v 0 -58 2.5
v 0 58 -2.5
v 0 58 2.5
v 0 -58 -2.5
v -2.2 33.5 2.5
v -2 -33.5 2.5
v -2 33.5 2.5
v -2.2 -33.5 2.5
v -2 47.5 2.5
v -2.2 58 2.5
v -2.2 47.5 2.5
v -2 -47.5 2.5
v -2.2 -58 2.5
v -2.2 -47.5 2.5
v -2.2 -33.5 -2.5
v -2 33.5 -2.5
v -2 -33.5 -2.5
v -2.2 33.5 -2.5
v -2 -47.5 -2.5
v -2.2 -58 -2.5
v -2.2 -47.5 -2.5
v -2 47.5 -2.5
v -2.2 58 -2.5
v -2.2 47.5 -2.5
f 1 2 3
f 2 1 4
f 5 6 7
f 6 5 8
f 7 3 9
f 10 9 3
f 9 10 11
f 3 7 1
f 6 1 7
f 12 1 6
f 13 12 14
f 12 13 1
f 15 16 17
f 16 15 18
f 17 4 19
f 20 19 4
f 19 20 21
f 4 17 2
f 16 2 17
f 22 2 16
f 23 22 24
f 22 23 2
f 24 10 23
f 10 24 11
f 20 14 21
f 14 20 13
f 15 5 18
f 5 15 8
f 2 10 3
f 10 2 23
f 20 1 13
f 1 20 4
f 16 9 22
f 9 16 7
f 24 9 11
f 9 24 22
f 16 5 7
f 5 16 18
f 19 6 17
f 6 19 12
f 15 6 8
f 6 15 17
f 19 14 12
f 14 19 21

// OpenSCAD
liner_heigth = 2.2;
liner_length = 120 - 4;
liner_width = 5;

cut_height = 2;
cut_width = 14;
cut_offset = 40.5;

//  translate([-liner_heigth*0.5, 0, 0])
//    cube([liner_heigth*2, 67, liner_width*2], center=true);

difference() {
  translate([-liner_heigth * 0.5, 0, 0])
    cube([liner_heigth, liner_length, liner_width], center=true);

  translate([-cut_height * 1.5 - cut_height, cut_offset, 0])
    cube([cut_height * 3, cut_width, liner_width + 1], center=true);

  translate([-cut_height * 1.5 - cut_height, -cut_offset, 0])
    cube([cut_height * 3, cut_width, liner_width + 1], center=true);
}
